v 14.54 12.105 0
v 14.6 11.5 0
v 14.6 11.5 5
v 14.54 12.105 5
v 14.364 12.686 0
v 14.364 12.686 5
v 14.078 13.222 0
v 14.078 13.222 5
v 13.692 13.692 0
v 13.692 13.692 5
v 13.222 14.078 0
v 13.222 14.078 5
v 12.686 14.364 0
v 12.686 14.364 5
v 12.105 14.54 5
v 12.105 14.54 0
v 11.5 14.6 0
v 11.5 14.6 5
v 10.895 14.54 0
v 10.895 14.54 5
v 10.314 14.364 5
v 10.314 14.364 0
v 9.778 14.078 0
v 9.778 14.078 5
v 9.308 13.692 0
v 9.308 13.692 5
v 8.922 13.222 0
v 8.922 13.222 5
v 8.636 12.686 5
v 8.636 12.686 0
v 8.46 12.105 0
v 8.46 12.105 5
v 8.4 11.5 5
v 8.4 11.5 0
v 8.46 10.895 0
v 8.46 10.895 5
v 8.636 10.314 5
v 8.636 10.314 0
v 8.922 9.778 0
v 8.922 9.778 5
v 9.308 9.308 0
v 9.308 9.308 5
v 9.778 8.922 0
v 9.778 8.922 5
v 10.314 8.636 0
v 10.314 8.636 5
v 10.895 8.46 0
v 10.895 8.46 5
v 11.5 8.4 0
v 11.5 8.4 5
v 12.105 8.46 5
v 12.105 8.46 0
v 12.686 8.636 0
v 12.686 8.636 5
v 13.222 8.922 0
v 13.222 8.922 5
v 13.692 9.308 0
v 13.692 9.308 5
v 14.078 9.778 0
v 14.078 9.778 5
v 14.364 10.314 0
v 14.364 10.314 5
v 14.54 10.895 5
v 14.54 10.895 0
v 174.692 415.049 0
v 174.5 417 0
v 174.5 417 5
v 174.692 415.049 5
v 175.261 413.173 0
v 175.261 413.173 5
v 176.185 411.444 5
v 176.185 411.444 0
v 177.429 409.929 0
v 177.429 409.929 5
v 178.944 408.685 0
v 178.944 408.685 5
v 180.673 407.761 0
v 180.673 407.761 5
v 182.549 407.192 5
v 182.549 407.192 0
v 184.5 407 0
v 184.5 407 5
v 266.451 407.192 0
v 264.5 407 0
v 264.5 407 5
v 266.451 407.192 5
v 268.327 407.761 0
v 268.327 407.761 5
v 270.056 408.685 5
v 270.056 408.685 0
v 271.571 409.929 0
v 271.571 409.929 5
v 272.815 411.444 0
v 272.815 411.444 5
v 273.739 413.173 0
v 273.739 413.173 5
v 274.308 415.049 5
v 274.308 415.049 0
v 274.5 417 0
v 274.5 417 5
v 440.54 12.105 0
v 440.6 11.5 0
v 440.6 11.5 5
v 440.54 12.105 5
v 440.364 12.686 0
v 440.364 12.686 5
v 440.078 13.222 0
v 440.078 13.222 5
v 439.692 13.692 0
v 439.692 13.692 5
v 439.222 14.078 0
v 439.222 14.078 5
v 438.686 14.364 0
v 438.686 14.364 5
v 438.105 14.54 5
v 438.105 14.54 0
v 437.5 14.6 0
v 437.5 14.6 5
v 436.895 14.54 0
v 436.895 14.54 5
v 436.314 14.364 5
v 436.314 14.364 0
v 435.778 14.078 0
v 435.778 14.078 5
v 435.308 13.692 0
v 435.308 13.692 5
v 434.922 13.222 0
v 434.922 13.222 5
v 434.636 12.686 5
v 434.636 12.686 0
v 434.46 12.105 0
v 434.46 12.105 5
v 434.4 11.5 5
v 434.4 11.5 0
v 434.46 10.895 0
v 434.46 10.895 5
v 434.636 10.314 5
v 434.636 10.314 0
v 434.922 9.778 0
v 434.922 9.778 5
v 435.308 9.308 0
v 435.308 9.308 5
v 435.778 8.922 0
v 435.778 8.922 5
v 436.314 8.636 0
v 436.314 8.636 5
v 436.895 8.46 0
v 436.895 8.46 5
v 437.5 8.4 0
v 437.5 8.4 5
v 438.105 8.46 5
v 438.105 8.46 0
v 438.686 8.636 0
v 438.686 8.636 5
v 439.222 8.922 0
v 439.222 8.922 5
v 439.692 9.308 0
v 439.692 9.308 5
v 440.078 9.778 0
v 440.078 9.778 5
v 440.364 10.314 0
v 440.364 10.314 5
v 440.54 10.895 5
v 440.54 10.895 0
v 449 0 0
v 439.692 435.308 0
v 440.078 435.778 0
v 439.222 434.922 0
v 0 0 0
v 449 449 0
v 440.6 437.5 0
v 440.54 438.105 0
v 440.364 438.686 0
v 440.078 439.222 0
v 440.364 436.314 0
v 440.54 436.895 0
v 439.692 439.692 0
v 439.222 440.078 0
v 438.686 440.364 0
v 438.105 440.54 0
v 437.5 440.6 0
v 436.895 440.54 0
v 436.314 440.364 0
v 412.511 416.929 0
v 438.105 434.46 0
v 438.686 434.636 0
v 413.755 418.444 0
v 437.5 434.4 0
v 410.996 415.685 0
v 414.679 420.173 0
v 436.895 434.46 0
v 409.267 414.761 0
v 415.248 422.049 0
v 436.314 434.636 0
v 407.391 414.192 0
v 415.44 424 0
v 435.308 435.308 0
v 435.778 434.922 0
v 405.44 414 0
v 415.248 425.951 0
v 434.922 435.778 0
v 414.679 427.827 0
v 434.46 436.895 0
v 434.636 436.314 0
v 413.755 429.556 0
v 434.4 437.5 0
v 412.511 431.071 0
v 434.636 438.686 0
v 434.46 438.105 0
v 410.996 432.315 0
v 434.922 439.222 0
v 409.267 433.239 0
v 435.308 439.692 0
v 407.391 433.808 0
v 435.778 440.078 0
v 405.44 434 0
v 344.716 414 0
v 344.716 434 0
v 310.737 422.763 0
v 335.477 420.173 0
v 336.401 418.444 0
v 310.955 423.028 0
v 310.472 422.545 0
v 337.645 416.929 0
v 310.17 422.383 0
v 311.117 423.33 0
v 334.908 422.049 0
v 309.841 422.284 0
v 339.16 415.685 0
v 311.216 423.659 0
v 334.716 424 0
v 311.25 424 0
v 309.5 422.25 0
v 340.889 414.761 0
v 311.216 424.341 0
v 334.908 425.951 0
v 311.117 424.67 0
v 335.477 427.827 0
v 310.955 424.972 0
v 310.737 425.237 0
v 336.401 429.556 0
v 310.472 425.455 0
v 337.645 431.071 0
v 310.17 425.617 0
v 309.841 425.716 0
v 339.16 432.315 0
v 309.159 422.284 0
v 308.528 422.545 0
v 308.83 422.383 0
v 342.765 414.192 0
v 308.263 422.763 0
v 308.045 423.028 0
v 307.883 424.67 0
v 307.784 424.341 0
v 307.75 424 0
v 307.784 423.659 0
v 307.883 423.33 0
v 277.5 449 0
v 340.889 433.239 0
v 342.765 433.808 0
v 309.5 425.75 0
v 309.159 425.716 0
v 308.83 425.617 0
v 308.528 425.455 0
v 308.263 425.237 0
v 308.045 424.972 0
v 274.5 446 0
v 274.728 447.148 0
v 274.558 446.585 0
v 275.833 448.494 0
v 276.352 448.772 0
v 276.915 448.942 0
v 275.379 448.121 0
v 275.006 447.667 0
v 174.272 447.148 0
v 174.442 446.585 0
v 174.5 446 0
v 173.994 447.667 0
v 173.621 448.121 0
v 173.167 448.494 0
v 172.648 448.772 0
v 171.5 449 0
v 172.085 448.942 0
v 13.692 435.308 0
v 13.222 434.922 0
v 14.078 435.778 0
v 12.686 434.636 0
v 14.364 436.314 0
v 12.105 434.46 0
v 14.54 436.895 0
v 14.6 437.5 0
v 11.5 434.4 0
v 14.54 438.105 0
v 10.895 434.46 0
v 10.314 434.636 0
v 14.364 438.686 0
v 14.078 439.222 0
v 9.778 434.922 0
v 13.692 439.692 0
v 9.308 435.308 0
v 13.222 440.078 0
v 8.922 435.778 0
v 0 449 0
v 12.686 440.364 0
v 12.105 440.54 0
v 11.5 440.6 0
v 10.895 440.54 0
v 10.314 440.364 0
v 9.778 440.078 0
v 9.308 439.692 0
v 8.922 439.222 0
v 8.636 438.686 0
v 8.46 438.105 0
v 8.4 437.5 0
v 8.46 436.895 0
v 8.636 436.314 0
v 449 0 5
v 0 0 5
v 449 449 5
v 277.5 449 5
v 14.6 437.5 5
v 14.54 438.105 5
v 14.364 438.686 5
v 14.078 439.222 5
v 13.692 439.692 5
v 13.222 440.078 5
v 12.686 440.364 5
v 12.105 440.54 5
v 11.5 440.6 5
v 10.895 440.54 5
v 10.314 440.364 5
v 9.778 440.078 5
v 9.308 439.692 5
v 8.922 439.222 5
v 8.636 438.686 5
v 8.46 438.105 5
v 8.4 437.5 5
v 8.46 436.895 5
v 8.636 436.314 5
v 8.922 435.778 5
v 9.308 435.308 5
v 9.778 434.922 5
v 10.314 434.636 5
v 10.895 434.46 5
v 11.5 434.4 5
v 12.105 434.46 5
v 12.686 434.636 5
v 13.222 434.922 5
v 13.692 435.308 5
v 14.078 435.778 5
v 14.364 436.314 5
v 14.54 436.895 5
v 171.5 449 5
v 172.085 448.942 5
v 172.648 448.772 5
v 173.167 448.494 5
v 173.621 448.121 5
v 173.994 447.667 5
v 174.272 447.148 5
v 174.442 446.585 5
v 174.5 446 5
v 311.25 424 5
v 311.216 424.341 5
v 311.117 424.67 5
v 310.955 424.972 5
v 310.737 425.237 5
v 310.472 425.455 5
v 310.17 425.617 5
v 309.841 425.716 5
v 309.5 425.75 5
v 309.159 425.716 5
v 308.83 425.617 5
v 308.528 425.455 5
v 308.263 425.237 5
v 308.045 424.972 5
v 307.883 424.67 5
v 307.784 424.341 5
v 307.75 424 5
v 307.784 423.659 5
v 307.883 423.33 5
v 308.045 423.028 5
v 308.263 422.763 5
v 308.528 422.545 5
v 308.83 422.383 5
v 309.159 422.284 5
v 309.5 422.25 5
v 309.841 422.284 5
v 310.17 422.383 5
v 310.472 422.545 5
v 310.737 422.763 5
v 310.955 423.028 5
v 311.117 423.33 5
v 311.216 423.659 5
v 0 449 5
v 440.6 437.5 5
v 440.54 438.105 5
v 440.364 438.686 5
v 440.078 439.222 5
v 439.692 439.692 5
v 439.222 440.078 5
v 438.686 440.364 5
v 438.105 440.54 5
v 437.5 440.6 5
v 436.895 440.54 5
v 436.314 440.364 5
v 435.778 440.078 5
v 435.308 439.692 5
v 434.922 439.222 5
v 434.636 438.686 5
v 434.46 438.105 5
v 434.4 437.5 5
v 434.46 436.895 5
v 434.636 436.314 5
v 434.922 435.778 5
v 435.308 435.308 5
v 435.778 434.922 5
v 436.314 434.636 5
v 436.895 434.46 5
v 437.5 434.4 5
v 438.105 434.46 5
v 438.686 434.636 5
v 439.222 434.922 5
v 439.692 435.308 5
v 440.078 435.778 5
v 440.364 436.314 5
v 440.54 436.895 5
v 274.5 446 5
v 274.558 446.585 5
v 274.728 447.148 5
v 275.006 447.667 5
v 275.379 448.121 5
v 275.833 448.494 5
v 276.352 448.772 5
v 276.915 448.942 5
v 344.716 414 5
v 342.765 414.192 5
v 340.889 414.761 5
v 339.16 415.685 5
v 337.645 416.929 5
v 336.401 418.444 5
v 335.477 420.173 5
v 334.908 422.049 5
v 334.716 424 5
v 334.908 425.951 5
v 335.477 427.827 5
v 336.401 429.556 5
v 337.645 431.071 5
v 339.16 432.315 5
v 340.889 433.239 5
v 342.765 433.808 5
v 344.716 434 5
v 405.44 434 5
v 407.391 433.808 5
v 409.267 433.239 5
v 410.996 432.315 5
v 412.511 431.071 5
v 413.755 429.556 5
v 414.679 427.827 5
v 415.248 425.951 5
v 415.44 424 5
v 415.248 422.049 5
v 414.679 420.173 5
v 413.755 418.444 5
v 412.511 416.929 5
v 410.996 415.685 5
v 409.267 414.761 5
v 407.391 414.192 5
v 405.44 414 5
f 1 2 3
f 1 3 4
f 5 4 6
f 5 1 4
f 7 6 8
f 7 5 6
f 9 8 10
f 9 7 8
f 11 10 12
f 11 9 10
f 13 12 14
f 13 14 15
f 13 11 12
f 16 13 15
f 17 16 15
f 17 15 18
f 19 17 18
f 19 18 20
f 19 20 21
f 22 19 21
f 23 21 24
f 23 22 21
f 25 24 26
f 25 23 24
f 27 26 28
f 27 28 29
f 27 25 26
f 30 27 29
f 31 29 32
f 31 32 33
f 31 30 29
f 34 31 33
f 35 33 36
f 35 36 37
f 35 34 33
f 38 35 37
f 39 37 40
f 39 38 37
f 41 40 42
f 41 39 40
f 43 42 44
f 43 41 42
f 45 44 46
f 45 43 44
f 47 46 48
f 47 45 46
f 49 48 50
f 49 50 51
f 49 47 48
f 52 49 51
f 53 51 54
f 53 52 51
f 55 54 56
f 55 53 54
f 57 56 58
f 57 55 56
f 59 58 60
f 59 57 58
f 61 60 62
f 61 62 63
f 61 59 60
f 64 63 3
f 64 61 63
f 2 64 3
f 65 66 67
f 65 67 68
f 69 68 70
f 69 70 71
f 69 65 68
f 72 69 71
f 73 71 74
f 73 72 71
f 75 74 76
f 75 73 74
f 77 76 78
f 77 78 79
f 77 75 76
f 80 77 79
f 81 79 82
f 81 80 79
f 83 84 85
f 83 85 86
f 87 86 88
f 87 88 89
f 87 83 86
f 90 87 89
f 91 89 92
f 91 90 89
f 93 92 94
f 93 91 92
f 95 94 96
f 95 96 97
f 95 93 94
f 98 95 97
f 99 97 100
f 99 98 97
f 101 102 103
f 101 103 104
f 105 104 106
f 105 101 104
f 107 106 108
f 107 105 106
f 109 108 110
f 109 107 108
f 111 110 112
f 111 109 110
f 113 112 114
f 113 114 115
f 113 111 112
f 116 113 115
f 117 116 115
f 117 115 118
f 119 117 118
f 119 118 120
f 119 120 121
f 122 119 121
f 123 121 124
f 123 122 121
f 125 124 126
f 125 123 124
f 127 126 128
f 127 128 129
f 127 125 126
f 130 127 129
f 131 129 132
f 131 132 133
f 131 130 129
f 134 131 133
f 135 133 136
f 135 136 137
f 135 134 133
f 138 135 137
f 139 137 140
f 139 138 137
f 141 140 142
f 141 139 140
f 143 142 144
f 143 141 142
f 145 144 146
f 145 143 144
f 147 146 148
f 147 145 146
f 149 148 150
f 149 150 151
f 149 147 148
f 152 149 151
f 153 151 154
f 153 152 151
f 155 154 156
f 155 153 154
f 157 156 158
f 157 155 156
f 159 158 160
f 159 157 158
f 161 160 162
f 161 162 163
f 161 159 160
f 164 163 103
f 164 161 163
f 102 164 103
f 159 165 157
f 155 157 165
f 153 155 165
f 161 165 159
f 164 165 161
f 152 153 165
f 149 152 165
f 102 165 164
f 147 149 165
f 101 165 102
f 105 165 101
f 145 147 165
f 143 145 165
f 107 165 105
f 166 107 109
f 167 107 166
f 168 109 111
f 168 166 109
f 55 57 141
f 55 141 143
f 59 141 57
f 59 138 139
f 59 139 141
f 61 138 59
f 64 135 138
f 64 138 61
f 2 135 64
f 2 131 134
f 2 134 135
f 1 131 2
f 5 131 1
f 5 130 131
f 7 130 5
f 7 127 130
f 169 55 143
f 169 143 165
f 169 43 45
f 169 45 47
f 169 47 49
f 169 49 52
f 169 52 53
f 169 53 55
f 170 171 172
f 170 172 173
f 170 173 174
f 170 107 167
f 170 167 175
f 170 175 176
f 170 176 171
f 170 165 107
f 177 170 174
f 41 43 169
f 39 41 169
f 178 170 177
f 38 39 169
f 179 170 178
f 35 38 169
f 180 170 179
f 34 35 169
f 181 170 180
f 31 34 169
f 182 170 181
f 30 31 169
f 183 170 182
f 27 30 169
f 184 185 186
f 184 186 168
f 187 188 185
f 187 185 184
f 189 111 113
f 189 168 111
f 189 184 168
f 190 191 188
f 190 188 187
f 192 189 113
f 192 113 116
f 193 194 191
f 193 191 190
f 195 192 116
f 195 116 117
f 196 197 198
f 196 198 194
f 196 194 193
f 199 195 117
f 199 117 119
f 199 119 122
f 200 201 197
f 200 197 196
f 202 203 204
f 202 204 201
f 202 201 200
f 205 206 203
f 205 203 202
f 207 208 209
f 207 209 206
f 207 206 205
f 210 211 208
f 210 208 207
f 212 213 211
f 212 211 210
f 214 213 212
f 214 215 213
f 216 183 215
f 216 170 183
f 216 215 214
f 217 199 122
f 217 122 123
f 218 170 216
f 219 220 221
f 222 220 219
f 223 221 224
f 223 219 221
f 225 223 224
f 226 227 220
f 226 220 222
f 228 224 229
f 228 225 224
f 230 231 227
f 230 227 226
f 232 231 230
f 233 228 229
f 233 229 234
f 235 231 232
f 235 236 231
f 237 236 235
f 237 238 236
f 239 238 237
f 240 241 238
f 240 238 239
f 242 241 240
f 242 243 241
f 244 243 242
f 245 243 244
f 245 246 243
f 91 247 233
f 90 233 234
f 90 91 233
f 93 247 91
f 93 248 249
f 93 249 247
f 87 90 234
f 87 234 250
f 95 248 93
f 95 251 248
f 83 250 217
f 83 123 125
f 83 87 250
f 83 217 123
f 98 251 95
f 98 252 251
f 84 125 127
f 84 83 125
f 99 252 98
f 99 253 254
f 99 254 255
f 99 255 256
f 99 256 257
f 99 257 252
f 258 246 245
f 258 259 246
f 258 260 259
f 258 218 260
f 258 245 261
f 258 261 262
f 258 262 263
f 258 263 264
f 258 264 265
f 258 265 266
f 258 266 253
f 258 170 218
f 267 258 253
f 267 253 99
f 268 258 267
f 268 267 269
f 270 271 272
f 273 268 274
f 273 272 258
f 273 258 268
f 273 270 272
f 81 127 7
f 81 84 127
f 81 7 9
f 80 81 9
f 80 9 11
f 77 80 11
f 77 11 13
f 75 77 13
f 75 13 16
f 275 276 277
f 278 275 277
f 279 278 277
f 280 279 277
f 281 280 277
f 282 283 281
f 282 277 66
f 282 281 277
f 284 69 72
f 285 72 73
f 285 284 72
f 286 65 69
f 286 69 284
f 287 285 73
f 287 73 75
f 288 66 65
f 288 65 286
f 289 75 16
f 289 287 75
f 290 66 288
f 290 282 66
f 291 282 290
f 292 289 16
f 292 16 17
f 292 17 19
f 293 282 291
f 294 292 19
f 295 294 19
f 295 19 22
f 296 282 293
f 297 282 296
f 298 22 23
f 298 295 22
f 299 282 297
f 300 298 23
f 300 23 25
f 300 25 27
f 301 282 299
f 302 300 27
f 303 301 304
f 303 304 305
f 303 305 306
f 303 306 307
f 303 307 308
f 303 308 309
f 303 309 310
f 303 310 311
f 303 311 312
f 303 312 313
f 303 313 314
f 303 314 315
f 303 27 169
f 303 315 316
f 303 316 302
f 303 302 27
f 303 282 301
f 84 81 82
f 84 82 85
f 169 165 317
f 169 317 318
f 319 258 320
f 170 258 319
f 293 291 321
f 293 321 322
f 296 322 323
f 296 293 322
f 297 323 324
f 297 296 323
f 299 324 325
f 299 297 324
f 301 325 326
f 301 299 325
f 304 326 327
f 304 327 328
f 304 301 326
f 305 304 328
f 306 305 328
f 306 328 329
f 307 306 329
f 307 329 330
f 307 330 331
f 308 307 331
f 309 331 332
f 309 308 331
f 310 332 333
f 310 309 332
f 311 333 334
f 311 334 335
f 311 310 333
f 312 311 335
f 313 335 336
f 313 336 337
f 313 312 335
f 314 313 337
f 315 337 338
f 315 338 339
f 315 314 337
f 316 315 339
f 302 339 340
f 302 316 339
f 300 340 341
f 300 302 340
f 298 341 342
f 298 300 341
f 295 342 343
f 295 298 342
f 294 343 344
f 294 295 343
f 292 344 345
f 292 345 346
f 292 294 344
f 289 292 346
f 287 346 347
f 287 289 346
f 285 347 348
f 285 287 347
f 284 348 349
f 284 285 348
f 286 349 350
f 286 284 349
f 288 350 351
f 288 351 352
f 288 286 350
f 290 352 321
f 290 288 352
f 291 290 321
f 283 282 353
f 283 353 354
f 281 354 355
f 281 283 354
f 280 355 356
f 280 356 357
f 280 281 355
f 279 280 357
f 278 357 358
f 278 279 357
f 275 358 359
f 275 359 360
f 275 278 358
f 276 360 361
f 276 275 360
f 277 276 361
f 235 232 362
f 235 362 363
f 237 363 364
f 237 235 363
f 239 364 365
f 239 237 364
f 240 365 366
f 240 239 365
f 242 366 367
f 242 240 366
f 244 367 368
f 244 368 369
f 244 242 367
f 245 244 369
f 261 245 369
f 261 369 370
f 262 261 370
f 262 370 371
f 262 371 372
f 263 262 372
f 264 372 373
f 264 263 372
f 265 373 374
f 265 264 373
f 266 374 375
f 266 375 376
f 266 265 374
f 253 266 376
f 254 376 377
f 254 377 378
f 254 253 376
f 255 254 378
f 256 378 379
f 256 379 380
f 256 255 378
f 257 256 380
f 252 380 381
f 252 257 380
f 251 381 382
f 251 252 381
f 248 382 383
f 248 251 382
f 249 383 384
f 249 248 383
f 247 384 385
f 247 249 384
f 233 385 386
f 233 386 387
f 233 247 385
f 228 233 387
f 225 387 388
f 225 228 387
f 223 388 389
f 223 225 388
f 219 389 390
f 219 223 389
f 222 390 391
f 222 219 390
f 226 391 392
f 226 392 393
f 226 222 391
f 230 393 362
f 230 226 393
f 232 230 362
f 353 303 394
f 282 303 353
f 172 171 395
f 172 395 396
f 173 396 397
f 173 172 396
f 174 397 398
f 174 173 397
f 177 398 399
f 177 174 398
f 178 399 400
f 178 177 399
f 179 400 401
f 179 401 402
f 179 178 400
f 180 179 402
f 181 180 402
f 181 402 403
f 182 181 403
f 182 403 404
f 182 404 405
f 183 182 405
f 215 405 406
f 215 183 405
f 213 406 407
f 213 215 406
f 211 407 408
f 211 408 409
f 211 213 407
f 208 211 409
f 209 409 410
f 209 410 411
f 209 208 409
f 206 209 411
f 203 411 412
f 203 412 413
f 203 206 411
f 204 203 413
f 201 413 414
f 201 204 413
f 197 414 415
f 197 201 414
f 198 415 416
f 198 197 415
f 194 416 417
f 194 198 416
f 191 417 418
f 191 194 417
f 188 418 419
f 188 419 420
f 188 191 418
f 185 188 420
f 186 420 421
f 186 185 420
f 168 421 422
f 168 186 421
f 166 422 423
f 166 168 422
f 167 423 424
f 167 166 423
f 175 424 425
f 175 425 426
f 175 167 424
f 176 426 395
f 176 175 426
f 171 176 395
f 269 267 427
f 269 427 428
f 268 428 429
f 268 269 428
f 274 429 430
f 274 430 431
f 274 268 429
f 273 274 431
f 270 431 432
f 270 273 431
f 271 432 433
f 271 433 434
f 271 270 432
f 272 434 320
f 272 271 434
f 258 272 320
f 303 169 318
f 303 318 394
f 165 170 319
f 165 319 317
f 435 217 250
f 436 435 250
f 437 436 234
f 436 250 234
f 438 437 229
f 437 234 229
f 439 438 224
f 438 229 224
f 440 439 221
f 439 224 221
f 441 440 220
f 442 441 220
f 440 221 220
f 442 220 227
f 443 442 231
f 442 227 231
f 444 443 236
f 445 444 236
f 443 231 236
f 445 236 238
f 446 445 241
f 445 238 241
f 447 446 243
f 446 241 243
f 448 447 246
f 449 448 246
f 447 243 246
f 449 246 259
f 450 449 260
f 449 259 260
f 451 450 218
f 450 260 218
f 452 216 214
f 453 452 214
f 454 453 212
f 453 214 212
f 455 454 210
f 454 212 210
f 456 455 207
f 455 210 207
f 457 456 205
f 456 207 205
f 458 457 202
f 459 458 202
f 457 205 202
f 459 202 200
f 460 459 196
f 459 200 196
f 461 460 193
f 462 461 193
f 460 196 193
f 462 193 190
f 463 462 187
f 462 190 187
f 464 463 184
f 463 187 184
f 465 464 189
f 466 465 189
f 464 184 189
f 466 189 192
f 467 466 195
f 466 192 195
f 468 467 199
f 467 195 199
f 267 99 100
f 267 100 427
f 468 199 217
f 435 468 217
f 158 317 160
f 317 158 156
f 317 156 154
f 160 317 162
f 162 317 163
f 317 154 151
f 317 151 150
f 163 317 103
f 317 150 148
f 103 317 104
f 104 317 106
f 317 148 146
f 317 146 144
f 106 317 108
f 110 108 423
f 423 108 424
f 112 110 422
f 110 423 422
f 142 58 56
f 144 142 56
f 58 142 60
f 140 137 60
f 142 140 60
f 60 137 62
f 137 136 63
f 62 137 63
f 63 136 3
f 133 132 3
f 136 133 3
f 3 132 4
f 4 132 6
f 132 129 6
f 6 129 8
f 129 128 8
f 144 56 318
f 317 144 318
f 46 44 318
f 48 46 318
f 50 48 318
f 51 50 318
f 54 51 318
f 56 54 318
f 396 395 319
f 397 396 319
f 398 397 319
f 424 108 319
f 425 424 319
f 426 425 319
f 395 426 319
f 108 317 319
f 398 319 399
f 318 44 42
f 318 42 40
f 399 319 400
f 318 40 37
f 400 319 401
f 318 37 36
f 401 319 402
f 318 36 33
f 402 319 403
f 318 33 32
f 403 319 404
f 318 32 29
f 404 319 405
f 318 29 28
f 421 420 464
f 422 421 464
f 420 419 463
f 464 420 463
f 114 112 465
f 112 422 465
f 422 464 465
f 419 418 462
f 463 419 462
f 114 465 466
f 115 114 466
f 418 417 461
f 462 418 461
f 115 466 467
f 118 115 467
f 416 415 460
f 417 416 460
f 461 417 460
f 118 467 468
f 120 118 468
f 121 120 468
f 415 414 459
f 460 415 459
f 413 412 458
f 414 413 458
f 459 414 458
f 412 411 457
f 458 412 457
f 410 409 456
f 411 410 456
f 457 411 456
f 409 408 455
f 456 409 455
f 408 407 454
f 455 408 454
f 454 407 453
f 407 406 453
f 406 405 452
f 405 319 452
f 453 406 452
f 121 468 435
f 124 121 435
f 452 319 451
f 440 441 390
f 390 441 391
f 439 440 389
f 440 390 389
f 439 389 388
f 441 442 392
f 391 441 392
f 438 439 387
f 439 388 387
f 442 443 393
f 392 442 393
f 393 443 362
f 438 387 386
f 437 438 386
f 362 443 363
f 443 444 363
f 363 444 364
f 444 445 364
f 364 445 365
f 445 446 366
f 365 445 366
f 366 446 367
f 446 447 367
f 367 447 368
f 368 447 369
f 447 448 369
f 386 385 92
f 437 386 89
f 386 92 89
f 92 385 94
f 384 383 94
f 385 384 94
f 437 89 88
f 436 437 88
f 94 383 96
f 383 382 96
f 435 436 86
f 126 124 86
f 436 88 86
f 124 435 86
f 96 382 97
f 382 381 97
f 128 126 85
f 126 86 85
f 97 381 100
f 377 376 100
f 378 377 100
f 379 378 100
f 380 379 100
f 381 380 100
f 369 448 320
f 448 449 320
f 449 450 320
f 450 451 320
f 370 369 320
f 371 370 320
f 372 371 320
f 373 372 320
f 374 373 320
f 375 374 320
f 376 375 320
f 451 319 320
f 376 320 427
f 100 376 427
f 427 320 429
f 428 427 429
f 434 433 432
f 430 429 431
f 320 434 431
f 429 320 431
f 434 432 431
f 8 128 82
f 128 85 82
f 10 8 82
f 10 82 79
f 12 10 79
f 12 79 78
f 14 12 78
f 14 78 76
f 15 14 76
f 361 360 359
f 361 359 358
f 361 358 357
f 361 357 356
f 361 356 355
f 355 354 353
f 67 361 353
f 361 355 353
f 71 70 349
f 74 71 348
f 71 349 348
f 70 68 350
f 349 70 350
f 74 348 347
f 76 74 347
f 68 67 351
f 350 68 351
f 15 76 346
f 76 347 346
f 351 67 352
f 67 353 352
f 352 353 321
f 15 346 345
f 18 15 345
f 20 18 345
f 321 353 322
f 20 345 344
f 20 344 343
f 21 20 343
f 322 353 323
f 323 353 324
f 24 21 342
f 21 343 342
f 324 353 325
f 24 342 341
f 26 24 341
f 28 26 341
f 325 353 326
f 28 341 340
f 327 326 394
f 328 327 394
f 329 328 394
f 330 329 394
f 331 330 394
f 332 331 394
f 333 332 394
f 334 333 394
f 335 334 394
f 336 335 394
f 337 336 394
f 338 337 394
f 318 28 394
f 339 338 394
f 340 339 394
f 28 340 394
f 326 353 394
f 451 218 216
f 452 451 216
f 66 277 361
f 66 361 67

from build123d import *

# Parameters (mm, degrees)
SCHIZZO1_R                   = 3.1
SCHIZZO1_R_2                 = 1.75
ESTRUSIONE_ESTRUSIONE1_DEPTH = 5


with BuildPart() as part:
    # Schizzo1 → Estrusione-Estrusione1 (new body)
    with BuildSketch(Plane.XY):
        with BuildLine():
            Line((0, 0), (0, 449))
            Line((0, 449), (171.5, 449))
            ThreePointArc((171.5, 449), (173.621320344, 448.121320344), (174.5, 446))
            Line((174.5, 446), (174.5, 417))
            ThreePointArc((174.5, 417), (177.428932188, 409.928932188), (184.5, 407))
            Line((184.5, 407), (264.5, 407))
            ThreePointArc((264.5, 407), (271.571067812, 409.928932188), (274.5, 417))
            Line((274.5, 417), (274.5, 446))
            ThreePointArc((274.5, 446), (275.378679656, 448.121320344), (277.5, 449))
            Line((277.5, 449), (449, 449))
            Line((449, 449), (449, 0))
            Line((449, 0), (0, 0))
        make_face()
        with Locations((11.5, 11.5)):
            Circle(SCHIZZO1_R, mode=Mode.SUBTRACT)
        with Locations((437.5, 11.5)):
            Circle(SCHIZZO1_R, mode=Mode.SUBTRACT)
        with Locations((437.5, 437.5)):
            Circle(SCHIZZO1_R, mode=Mode.SUBTRACT)
        with Locations((11.5, 437.5)):
            Circle(SCHIZZO1_R, mode=Mode.SUBTRACT)
        with Locations((309.5, 424)):
            Circle(SCHIZZO1_R_2, mode=Mode.SUBTRACT)
        with BuildLine():
            Line((344.715899345, 434), (405.440355678, 434))
            ThreePointArc((405.440355678, 434), (415.440355678, 424), (405.440355678, 414))
            Line((405.440355678, 414), (344.715899345, 414))
            ThreePointArc((344.715899345, 414), (334.715899345, 424), (344.715899345, 434))
        make_face(mode=Mode.SUBTRACT)
    extrude(amount=ESTRUSIONE_ESTRUSIONE1_DEPTH)


solid = part.part
